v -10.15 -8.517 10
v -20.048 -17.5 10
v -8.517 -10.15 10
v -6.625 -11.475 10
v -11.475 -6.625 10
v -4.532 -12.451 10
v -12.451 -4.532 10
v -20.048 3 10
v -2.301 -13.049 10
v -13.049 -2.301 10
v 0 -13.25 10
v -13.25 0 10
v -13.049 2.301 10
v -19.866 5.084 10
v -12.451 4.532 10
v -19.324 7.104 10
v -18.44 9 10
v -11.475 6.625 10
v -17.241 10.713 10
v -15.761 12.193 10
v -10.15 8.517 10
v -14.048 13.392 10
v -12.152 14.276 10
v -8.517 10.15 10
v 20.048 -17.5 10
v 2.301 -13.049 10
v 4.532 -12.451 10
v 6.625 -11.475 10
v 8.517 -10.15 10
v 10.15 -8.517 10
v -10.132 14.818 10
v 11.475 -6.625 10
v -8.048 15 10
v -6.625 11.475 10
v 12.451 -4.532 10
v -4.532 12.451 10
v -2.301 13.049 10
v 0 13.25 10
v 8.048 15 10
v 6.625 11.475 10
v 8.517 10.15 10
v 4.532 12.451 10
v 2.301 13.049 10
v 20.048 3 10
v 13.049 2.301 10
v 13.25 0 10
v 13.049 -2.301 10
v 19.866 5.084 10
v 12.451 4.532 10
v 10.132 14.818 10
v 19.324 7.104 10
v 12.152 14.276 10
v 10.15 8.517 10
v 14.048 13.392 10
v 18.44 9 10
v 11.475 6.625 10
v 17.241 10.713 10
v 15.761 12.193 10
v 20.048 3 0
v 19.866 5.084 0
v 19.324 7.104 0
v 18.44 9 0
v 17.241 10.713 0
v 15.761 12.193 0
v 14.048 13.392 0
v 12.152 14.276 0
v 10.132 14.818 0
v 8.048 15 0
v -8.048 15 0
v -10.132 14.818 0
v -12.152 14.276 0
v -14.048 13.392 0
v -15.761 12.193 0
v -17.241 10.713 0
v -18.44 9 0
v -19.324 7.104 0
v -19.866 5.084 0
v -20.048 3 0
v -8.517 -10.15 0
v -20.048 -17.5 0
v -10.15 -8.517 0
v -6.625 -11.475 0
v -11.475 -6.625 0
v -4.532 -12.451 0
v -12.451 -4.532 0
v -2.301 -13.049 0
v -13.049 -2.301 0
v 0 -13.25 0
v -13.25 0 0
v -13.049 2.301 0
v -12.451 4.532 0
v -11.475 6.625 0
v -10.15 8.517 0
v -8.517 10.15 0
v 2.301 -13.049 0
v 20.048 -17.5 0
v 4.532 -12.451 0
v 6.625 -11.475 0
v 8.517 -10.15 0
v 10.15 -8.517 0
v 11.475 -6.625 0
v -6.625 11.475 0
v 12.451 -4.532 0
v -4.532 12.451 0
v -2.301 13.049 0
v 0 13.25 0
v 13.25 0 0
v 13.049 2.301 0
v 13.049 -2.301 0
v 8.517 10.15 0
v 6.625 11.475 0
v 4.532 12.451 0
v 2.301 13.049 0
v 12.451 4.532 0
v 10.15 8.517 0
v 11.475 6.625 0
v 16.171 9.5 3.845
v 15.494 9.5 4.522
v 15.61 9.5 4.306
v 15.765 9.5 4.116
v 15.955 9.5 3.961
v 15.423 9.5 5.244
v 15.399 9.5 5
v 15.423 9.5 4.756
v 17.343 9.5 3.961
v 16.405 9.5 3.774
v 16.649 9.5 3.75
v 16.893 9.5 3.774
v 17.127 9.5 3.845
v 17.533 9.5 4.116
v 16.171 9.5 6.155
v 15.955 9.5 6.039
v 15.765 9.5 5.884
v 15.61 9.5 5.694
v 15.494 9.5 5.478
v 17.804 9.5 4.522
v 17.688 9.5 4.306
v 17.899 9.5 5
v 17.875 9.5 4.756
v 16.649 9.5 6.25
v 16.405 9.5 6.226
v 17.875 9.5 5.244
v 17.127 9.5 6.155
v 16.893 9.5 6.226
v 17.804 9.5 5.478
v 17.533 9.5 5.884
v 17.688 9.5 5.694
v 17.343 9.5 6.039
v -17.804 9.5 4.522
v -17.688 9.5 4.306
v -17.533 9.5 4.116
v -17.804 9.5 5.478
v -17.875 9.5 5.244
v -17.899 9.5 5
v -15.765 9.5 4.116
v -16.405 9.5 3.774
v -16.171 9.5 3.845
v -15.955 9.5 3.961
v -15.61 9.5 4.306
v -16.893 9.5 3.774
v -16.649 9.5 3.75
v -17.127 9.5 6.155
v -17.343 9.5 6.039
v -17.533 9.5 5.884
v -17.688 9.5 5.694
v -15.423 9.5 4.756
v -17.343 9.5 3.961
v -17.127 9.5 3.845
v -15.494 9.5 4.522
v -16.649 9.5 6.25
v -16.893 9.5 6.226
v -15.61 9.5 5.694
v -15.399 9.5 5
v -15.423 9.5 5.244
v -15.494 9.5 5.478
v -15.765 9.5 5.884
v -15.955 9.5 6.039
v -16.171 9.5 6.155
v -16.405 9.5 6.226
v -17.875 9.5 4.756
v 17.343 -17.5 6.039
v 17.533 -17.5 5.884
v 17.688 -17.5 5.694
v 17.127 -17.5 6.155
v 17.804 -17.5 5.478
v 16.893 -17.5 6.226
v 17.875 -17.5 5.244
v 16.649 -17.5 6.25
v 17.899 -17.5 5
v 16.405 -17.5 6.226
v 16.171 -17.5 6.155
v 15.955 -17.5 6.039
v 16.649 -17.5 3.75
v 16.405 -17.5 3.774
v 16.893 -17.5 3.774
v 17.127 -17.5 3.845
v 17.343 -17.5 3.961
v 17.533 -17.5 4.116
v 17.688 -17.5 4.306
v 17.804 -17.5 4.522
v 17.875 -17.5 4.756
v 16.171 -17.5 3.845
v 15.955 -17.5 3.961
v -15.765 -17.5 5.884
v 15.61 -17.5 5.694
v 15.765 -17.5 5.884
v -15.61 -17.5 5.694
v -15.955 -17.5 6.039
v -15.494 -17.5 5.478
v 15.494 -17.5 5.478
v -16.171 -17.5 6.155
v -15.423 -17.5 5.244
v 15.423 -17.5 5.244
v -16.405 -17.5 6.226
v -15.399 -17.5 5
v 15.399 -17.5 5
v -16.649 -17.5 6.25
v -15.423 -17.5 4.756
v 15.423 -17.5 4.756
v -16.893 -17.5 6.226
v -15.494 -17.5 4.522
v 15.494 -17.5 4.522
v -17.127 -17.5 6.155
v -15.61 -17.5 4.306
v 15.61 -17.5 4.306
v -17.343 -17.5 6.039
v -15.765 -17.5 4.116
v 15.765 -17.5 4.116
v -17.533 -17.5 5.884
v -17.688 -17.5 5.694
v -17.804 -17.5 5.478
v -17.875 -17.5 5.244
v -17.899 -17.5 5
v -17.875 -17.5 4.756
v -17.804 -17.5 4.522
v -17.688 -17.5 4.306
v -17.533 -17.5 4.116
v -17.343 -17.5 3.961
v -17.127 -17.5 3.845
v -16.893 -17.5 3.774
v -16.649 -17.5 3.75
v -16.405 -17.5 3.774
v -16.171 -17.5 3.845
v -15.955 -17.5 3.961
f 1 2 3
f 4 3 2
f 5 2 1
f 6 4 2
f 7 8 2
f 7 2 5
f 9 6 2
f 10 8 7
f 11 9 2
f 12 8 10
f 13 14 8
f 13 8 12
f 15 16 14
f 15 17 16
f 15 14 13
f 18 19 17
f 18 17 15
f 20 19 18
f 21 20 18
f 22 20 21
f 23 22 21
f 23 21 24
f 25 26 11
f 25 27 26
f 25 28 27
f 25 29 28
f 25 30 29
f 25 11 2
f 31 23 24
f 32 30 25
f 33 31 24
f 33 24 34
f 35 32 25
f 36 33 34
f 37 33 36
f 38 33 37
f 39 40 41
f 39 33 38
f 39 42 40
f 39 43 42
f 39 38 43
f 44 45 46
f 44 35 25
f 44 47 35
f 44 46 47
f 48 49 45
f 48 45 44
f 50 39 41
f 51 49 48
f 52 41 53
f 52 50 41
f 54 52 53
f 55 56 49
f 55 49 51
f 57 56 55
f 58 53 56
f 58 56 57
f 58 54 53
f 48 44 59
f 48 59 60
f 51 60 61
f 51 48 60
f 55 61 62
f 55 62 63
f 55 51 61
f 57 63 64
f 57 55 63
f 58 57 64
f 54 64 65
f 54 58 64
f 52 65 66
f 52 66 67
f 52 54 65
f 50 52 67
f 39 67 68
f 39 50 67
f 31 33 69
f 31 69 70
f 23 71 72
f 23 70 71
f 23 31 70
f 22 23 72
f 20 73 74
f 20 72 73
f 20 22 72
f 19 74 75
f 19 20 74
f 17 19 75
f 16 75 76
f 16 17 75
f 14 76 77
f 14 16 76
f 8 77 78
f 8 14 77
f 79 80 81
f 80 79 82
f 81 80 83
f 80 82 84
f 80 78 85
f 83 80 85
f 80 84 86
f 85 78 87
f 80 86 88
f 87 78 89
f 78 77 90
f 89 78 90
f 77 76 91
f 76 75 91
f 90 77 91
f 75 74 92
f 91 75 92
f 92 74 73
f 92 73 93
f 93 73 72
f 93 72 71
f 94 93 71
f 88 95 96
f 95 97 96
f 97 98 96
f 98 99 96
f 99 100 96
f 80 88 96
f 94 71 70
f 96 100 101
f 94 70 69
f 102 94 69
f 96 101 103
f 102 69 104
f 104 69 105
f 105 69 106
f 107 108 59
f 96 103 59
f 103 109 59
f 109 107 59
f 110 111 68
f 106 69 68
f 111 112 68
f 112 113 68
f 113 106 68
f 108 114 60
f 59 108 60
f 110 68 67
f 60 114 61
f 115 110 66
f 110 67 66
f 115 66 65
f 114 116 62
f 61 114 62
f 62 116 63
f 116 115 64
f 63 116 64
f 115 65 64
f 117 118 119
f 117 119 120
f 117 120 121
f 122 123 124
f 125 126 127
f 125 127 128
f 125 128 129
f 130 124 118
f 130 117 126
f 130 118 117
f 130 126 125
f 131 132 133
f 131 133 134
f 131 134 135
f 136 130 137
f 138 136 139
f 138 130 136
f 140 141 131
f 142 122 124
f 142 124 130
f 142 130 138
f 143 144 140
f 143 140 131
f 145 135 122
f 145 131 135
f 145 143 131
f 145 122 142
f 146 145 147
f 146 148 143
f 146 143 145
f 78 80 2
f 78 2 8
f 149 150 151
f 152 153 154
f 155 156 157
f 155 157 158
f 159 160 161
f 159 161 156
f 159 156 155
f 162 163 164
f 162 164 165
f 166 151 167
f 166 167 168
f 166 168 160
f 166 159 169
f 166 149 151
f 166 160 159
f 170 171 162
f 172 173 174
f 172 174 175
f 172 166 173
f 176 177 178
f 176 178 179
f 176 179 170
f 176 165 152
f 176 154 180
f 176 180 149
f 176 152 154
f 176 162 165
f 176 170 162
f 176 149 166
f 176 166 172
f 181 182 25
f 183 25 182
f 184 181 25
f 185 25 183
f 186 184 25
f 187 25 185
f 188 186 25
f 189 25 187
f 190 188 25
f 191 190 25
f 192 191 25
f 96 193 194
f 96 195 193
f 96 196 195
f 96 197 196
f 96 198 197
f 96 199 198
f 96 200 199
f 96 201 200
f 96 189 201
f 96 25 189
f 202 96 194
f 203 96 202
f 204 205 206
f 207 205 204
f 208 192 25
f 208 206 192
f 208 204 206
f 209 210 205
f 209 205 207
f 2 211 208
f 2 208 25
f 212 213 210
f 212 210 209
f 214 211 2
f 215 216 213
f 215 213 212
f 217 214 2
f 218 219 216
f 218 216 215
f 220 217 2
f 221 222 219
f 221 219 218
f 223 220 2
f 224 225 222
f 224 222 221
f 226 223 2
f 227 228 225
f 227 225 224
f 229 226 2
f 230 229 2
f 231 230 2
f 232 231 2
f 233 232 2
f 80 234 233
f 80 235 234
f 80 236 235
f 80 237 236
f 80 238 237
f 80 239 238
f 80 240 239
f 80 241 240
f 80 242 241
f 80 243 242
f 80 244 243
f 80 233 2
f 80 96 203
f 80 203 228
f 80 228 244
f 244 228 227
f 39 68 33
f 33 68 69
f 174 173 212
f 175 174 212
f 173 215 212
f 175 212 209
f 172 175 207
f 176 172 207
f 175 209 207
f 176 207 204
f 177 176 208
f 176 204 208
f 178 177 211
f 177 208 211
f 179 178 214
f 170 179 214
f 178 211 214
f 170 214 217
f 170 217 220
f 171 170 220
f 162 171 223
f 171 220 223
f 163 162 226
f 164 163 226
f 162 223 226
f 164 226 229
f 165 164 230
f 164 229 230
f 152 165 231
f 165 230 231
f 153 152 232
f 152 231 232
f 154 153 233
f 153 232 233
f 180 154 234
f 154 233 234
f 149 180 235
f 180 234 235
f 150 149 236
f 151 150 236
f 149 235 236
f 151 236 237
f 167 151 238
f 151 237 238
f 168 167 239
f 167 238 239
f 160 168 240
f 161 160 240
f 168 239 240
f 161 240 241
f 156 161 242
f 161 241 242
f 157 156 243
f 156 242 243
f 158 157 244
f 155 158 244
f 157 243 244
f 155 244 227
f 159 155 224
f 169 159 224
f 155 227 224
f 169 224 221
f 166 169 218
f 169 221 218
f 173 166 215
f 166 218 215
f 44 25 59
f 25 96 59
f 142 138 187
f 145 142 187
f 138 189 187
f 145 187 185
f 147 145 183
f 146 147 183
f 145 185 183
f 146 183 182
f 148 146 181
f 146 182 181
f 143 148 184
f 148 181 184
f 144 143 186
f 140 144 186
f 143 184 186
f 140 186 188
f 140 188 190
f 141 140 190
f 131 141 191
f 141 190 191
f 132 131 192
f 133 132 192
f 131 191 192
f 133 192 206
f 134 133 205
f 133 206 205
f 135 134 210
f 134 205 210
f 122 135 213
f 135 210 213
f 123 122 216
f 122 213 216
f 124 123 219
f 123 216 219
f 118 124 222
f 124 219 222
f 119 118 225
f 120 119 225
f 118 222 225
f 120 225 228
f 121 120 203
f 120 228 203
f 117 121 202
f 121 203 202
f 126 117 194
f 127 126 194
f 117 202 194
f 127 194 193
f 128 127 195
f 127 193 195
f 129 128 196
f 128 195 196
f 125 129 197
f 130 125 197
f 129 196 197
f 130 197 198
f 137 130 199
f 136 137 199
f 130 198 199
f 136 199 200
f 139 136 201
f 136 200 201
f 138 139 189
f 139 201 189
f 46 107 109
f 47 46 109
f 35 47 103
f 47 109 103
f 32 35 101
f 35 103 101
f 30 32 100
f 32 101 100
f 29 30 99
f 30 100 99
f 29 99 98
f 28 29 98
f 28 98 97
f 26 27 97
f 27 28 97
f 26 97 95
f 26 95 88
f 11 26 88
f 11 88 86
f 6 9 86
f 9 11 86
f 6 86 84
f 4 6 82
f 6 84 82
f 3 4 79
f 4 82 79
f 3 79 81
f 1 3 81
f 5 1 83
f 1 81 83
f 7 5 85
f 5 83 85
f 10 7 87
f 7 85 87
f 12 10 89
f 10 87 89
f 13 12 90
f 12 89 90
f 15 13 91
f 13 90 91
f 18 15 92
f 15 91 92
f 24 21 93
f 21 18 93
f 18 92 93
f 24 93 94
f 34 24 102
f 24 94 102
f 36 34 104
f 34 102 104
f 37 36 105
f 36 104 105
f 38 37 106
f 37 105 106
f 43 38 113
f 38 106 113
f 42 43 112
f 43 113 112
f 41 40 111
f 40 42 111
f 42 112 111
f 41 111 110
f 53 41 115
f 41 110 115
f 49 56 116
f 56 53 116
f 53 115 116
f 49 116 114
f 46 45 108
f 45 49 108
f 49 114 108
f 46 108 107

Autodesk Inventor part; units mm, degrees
ref_plane "YZ Plane" through (0, 0, 0) normal (1, 0, 0) x (0, 1, 0)
ref_plane "XZ Plane" through (0, 0, 0) normal (0, 1, 0) x (-1, 0, 0)
ref_plane "XY Plane" through (0, 0, 0) normal (0, 0, 1) x (1, 0, 0)
sketch "Sketch1" plane through (0, 0, 0) normal (0, 0, 1) x (1, 0, 0)
  line L0 (16, -17.5) -> (16, 15)
  line L1 (-16, 15) -> (-16, -17.5)
  circle A0 centre (0, 0) radius 13.25
  line L2 (16, -17.5) -> (-16, -17.5)
  line L3 (-16, -17.5) -> (-16, 15)
  line L4 (16, 15) -> (-16, 15)
  dimension "d2" = 26.5
  dimension "d4" = 17.5
  dimension "d5" = 32.5
extrude "Extrusion1" add sketch "Sketch1" along normal blind 10
sketch "Sketch2" plane through (0, 0, 0) normal (0, 0, -1) x (-1, 0, 0)
  point P0 (0, 0)
sketch "Sketch3" plane through (0, 0, 0) normal (0, 0, -1) x (-1, 0, 0)
  line L0 (16, 15) -> (16, -17.5) projected
  line L1 (17.8498, -17.5) -> (20.048, -17.5)
  line L2 (20.048, -17.5) -> (20.048, 15)
  line L3 (20.048, 15) -> (16, 15)
  line L4 (-16, 15) -> (16, 15) projected
  line L5 (16, -17.5) -> (16, 15)
  line L6 (0, 0) -> (0, 7.3422)
  line L7 (-16, 15) -> (-16, -17.5)
  line L8 (-17.8498, -17.5) -> (-20.048, -17.5)
  line L9 (-20.048, -17.5) -> (-20.048, 15)
  line L10 (-20.048, 15) -> (-16, 15)
  line L11 (17.8498, -17.5) -> (16, -17.5)
  line L12 (16, 15) -> (16, -17.5) projected
  line L13 (20.048, 15) -> (16, 15)
  line L14 (16, -17.5) -> (-16, -17.5) projected
  line L15 (-17.8498, -17.5) -> (-16, -17.5)
extrude "Extrusion2" add sketch "Sketch3" against normal up to surface (10 mm away) contours L3 L2 L1 L11 L0 | L7 L15 L8 L9 L10
sketch "Sketch4" plane through (-20.048, -17.5, 0) normal (0, -1, 0) x (1, 0, 0)
  line L0 (40.0961, 0) -> (0, 0) projected
  line L1 (40.0961, 10) -> (0, 10) projected
  circle A0 centre (3.399, 5) radius 1.25
  circle A1 centre (36.697, 5) radius 1.25
  point P0 (20.048, 0)
  dimension "d11" = 2.5
extrude "Extrusion3" cut sketch "Sketch4" against normal blind 27
fillet "Fillet1" radius 12 2 edges at (20.048, 15, 5) (-20.048, 15, 5)
sketch "Sketch5" plane through (-20.048, -17.5, 0) normal (0, -1, 0) x (1, 0, 0)
  circle A0 centre (3.399, 5) radius 1.25 projected
  circle A1 centre (36.697, 5) radius 1.25 projected
  point P0 (20.048, 0)
  dimension "d15" = 33.298
properties part number "motor holder"
